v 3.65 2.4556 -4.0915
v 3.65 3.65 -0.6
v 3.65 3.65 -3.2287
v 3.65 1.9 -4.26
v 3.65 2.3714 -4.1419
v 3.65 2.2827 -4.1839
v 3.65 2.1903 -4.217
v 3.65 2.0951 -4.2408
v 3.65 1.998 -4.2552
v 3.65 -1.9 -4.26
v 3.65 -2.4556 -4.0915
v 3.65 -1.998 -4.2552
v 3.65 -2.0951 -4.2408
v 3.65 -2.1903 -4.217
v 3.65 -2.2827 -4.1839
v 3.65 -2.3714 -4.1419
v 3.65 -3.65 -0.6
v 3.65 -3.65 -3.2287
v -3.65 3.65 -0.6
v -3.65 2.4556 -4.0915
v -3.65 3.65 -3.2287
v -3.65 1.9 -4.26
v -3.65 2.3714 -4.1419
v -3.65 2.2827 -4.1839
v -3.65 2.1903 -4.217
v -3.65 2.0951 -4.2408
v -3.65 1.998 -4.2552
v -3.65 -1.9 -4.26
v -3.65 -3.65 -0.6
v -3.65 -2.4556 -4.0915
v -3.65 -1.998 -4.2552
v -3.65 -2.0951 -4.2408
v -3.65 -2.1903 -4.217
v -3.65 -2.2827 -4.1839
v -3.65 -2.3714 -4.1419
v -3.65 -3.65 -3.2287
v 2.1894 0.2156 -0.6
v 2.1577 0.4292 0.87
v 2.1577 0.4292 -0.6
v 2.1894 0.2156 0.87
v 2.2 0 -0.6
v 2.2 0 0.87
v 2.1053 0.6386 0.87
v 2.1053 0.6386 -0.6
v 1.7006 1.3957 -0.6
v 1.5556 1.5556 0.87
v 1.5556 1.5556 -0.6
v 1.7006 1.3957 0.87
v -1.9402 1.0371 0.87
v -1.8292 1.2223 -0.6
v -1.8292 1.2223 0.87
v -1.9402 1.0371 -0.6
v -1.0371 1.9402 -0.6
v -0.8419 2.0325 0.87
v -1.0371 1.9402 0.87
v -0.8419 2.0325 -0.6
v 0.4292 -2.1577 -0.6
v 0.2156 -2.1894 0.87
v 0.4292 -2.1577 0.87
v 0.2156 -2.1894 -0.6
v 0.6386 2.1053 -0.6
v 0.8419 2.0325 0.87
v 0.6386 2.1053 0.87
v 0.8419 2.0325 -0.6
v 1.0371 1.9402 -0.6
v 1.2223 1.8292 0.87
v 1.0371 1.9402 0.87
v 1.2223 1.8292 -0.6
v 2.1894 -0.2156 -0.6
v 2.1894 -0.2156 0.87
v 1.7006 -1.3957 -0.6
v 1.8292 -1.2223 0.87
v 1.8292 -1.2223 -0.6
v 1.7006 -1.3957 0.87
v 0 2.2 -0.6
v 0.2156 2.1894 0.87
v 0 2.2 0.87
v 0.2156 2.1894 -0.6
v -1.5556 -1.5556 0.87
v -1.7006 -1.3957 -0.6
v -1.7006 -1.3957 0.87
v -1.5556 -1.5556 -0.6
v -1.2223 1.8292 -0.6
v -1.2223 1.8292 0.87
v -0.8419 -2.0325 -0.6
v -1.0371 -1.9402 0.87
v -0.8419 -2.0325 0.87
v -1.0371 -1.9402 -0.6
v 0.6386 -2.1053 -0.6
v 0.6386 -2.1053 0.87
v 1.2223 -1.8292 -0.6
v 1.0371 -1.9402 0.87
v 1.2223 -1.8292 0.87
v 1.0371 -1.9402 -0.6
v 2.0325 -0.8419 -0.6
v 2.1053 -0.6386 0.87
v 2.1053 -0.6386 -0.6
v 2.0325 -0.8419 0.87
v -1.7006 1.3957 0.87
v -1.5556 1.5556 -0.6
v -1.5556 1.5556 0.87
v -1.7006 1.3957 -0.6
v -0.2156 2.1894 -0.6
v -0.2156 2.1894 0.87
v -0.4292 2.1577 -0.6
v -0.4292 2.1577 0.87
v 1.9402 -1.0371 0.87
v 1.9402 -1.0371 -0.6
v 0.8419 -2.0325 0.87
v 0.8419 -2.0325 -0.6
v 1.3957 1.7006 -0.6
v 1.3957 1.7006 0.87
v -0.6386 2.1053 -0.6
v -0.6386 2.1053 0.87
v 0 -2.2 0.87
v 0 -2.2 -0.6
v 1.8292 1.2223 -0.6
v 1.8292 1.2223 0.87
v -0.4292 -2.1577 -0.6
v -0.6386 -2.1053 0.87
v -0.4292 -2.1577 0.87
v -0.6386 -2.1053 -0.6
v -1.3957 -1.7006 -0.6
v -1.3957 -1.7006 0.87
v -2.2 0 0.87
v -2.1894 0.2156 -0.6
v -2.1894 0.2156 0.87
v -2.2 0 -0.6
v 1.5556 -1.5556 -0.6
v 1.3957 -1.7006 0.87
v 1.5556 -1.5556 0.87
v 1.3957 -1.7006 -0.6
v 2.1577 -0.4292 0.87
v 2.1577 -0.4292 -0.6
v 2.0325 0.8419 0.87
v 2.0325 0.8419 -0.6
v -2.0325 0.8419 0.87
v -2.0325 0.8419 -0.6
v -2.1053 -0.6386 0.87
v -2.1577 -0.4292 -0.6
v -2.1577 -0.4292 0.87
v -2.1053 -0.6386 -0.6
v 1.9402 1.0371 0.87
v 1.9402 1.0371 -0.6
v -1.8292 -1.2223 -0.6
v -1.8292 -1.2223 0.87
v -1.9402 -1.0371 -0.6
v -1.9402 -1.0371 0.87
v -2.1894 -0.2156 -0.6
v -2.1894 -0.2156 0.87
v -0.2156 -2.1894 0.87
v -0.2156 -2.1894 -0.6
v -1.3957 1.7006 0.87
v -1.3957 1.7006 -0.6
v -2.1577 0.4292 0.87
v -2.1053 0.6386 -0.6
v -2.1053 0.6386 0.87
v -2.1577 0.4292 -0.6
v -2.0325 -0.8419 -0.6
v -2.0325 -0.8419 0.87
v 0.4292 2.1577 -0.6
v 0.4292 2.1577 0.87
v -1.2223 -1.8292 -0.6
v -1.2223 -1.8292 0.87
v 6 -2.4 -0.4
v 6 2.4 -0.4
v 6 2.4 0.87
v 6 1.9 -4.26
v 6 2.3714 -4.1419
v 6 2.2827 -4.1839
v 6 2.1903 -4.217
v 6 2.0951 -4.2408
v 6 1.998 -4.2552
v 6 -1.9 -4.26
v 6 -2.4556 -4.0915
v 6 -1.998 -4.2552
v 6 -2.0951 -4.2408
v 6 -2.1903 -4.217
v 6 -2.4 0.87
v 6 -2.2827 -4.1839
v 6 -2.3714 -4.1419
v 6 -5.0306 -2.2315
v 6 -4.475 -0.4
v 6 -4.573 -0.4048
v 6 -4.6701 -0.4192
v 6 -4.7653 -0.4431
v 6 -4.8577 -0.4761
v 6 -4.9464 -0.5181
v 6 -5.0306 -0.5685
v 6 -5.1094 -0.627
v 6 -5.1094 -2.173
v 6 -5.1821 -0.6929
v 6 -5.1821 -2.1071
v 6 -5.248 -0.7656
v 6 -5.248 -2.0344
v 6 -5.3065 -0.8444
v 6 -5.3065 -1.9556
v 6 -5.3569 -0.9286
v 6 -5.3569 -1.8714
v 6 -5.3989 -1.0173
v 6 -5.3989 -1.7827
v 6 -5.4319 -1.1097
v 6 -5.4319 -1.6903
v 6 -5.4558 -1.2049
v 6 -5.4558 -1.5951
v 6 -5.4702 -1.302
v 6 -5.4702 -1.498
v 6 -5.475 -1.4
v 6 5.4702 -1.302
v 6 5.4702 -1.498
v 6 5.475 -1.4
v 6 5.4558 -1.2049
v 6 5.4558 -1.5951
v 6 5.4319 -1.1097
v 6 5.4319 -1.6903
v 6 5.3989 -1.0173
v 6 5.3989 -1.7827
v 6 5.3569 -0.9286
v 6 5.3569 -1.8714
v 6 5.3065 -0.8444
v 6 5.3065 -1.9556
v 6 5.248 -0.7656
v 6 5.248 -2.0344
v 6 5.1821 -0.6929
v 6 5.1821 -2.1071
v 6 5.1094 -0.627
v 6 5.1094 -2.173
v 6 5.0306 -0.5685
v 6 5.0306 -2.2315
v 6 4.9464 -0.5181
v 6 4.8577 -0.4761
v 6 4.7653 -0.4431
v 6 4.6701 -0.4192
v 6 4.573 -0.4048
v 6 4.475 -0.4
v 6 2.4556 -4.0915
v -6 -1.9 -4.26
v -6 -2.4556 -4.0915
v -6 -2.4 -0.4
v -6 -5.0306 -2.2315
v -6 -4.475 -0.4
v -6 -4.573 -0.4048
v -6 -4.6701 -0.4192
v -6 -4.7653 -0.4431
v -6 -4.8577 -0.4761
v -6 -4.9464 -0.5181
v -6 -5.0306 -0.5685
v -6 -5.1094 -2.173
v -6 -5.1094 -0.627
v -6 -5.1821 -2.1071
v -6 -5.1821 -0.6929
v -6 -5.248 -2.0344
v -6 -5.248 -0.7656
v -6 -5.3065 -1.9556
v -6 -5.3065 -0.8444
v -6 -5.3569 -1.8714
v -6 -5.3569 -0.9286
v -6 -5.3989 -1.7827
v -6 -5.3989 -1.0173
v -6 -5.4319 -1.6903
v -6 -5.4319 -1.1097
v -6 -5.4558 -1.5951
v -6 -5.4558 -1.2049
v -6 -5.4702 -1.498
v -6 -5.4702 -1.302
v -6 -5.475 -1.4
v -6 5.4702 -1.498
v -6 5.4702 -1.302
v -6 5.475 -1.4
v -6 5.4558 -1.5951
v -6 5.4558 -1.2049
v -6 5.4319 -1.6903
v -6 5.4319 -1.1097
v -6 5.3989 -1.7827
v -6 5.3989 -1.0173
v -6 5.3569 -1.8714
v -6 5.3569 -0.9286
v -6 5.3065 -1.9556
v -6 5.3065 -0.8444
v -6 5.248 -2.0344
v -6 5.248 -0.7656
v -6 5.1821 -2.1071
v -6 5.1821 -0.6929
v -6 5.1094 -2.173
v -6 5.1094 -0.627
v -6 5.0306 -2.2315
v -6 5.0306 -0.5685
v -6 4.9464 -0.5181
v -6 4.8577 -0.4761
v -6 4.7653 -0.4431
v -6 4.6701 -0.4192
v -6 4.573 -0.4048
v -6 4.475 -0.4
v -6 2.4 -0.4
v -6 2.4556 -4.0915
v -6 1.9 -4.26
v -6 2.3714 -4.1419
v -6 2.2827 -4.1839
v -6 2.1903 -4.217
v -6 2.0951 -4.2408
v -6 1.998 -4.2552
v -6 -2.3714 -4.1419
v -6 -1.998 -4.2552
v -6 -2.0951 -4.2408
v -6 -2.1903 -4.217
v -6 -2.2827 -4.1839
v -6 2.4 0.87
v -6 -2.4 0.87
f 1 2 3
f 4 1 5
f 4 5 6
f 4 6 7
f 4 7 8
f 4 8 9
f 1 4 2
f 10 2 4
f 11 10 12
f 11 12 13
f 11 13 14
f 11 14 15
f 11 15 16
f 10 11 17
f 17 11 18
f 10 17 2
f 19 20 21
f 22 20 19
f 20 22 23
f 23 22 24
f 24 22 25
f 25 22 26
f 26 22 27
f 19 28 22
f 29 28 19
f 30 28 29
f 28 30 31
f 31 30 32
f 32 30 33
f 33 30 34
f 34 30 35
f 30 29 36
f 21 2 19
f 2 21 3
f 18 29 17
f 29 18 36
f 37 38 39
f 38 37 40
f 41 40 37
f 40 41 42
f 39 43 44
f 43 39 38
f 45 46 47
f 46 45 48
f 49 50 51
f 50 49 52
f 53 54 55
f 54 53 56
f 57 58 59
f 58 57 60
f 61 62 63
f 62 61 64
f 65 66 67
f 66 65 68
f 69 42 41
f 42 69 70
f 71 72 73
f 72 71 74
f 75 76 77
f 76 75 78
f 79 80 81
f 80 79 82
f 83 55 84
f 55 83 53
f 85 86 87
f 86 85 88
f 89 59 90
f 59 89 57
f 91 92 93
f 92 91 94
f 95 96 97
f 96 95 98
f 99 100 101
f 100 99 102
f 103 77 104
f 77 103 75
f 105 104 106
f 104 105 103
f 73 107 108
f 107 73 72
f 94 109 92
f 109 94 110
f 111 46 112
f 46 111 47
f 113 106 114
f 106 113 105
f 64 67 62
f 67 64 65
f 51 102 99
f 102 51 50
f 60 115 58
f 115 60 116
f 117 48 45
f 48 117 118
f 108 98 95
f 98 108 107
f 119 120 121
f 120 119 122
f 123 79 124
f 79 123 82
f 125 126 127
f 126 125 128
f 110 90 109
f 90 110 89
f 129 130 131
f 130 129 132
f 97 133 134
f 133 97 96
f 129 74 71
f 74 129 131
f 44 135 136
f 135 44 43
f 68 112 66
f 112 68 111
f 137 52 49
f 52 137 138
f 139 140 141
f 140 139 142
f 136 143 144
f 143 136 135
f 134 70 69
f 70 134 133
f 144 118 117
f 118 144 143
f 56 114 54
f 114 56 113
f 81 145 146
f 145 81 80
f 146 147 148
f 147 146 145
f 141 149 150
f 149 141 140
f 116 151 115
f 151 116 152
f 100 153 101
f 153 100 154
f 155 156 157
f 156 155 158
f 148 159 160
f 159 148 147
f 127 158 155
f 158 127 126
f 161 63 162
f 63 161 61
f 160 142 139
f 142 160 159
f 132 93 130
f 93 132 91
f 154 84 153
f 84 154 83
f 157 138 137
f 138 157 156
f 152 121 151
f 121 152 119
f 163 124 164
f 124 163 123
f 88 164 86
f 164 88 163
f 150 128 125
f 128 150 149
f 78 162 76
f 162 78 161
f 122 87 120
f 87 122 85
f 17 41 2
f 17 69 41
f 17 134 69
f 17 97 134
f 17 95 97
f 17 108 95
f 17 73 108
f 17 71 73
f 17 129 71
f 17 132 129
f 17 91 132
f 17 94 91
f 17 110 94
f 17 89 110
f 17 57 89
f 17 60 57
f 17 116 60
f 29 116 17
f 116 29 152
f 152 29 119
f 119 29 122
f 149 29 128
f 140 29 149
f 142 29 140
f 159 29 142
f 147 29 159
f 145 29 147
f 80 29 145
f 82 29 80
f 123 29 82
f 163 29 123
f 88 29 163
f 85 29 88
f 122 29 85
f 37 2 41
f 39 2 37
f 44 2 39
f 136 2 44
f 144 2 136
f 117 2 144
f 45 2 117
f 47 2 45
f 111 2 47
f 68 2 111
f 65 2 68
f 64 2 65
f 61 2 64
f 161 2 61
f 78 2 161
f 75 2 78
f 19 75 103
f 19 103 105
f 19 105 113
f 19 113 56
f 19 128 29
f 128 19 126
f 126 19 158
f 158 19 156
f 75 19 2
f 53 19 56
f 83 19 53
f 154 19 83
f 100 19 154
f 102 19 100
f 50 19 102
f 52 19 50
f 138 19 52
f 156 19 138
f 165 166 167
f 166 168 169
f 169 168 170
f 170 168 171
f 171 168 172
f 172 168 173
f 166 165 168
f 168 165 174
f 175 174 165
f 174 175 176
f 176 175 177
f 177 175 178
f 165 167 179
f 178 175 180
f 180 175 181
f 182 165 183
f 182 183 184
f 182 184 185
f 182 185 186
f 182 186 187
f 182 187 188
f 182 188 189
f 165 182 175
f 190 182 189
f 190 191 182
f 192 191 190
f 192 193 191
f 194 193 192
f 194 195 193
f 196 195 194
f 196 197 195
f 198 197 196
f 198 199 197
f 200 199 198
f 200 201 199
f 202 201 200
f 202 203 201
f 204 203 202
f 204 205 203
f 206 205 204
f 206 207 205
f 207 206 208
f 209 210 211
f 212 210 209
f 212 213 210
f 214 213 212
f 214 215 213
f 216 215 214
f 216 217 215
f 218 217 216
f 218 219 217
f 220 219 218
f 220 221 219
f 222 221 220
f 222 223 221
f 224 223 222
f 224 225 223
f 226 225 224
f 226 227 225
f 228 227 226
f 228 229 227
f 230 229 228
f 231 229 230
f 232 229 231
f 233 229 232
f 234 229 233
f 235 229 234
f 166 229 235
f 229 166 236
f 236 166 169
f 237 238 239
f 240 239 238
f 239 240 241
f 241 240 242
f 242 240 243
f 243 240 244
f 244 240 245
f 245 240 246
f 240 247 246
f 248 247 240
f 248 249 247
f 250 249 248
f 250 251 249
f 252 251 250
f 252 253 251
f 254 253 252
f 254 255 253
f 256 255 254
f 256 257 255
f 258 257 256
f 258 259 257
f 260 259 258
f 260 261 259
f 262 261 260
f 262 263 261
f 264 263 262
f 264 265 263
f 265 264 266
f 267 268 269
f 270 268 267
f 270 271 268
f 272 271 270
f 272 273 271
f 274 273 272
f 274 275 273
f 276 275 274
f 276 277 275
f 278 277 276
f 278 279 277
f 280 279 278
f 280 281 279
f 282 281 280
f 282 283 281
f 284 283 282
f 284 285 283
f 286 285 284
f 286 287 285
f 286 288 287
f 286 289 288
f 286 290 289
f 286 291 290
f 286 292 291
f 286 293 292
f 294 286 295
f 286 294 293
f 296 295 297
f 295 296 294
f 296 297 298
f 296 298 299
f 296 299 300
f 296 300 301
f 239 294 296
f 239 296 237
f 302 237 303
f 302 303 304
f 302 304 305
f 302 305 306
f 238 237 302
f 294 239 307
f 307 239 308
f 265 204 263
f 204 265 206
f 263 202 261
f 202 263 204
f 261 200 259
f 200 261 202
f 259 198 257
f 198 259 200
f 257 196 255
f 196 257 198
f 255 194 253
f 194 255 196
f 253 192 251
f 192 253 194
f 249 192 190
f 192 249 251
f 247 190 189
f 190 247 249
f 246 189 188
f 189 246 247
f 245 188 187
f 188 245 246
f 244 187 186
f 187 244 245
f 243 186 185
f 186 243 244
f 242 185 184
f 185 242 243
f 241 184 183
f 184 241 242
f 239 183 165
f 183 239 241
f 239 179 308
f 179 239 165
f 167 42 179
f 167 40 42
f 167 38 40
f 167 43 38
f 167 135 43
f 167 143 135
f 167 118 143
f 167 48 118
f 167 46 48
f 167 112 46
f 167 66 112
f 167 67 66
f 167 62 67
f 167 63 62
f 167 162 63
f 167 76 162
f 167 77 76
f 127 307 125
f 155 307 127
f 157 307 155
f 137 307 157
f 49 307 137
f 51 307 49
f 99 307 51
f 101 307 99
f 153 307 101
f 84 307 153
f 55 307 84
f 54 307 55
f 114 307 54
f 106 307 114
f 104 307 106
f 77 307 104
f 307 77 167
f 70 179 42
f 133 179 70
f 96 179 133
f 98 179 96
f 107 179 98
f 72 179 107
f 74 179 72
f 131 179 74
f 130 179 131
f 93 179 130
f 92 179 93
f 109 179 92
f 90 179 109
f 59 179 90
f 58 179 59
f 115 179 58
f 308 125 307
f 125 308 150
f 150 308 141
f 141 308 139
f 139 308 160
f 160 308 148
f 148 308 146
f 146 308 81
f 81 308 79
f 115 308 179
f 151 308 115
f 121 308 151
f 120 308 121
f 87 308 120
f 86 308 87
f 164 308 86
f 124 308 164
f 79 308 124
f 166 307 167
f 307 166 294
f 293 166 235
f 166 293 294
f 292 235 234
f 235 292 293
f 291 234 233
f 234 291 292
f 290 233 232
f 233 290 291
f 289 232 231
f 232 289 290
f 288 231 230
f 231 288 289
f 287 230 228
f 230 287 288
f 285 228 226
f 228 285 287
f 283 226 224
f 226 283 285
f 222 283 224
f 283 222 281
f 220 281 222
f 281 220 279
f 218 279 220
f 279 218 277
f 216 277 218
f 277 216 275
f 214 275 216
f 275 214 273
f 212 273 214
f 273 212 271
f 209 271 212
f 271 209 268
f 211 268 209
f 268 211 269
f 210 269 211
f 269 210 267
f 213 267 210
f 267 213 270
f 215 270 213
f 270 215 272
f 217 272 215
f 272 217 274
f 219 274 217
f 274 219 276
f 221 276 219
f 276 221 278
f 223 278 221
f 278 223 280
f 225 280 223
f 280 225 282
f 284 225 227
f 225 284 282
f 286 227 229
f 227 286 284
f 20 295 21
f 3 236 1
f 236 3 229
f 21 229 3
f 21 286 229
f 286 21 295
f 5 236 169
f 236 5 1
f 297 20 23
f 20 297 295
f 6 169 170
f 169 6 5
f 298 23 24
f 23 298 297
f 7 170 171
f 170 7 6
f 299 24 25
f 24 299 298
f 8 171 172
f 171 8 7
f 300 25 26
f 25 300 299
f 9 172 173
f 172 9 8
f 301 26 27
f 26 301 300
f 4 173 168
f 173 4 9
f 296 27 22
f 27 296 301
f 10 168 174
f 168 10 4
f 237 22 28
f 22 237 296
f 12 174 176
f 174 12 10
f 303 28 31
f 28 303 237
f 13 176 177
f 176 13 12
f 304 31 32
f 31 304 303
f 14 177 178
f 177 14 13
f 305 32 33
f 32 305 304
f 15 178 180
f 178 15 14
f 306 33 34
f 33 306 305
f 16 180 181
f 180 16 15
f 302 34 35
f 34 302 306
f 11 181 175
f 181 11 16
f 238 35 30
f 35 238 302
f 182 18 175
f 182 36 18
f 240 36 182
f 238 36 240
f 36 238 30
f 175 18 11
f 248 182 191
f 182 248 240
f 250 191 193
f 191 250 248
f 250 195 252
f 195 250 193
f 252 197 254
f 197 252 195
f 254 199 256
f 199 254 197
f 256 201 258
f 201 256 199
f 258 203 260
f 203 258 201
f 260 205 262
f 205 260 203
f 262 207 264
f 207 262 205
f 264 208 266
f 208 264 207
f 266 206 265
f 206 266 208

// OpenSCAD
$fn=64;

h=12;

tol=0.4;

nut=[6.9+tol,6.9+tol,3+tol];
bolt=4+tol;

/// location of nut and direction of inserting
//nutZ=[0,5];
nutZ=[-5,-1+tol];

/////// profile 20x20
	prof=20;
	gap = 5.2;
	wall = 1.74;
	depth = 6.4;
	width1 = 4.6;
	width2 = 11.75;
	r1 = 1.5;
	r2 = 1;
/////// profile 20x20

not = 0.01;
inf=100;

///////////////////////////////////////


difference(){
	tr([h/2,0,wall/2],[0,-90,0]) linear_extrude(height=h){
		//profile2D();
		block();
	}
	
	r(0) union(){
		for(z=[nutZ[0]:nut.z/2:nutZ[1]]){
			t([0,0,-nut.z+z]) nutNegative(nut,bolt);
		}
		t([0,0,-nut.z+nutZ[1]]) nutNegative(nut,bolt);
	}
}

///////////////////////////////////////
module nut(size=[10,10,5],bolt=5){
	difference(){
		t([-size.x/2,-size.y/2,0]) cube(size);
		t([0,0,-size.z]) cylinder(d=bolt,h=3*size.z);
	}
}

module nutNegative(size=[10,10,5],bolt=5){
	t([-size.x/2,-size.y/2,0]) cube(size);
	t([0,0,-inf]) cylinder(d=bolt,h=2*inf);
}

module block(){
	t([-(prof/2-wall/2),0,0]){	
		hull(){
			for(y=[-1,1]) t([prof/2-wall-r2-tol,y*(width2/2-r2-tol)]) circle(r=r2);
			for(y=[-1,1]) t([prof/2-depth+r2+tol,y*(width1/2-tol)]) circle(r=r2);
		}
				
		t([prof/2-wall,0]) square([wall,gap-tol],center=true);
	}
}

module bolt(bolt=3, boltHead=6, boltPad=3, boltHeadL=10, boltL=30, nut=6.3, nutPad=5, nutL=4, nutR=0, sideCutL=20, sideCutSlot=4, layer1=0.2, layer2=0.2, tol=0.2, not=0.01){
	
	bottom=layer1>0?true:false;
	top=layer2>0?true:false;
	
	t([0,0,-boltL+not+boltPad]) cylinder(d=bolt+tol,h=boltL);

	t([0,0,boltPad-2*layer1]) difference(){
		cylinder(d=boltHead+tol,h=boltHeadL+2*layer1);
		
		//easy print bolt
		if(layer1>0){
			t([(bolt+tol)/2,-(boltHead+tol)/2,-not]) cube([(boltHead-bolt)/2,boltHead+tol,2*layer1+not]);
			t([-(boltHead+tol)/2,-(boltHead+tol)/2,-not]) cube([(boltHead-bolt)/2,boltHead+tol,2*layer1+not]);
			t([-(boltHead+tol)/2,-(boltHead+tol)/2,-not]) cube([boltHead+tol,(boltHead-bolt)/2,layer1+not]);
			t([-(boltHead+tol)/2,(bolt+tol)/2,-not]) cube([boltHead+tol,(boltHead-bolt)/2,layer1+not]);
		}
	}
	
	//nut
	if(nut>0 && nutL>0){
		rotate([0,0,nutR]) difference(){
			t([0,0,-nutPad-nutL-sideCutSlot-2*layer1]){
				cylinder(d=nut+tol,h=nutL+sideCutSlot+2*layer1+2*layer2,$fn=6);
				hull(){
					for(x=[0,sideCutL]) t([x,0,0]) cylinder(d=nut+tol,h=nutL+2*layer1,$fn=6);
				}
			}
		
		//easy print nut slot
		if(layer1>0){
				t([(bolt+tol)/2,-nut/2,-nutPad-nutL-sideCutSlot-2*layer1-not]) cube([sideCutL+nut+tol,nut,2*layer1+not]);
				t([-(bolt+tol)/2-nut,-nut/2,-nutPad-nutL-sideCutSlot-2*layer1-not]) cube([nut,nut,2*layer1+not]);
				t([-nut/2,-(bolt+tol)/2-nut,-nutPad-nutL-sideCutSlot-2*layer1-not]) cube([nut,nut,layer1+not]);
				t([-nut/2,+(bolt+tol)/2,-nutPad-nutL-sideCutSlot-2*layer1-not]) cube([nut,nut,layer1+not]);
			}				
		
		//easy print nut
		if(layer2>0){
				t([(bolt+tol)/2,-nut/2,-nutPad]) cube([nut,nut,2*layer2+not]);
				t([-(bolt+tol)/2-nut,-nut/2,-nutPad]) cube([nut,nut,2*layer2+not]);
				t([-nut/2,-(bolt+tol)/2-nut,-nutPad+layer2]) cube([nut,nut,layer2+not]);
				t([-nut/2,+(bolt+tol)/2,-nutPad+layer2]) cube([nut,nut,layer2+not]);
			}
		}
	}
}


///////////////////////////////////////

module t(v=[0,0,0]){translate(v) children();}
module r(a=[0,0,0],rp=[0,0,0]){translate(rp) rotate(a) translate(-rp) children();}
module tr(v=[0,0,0],a=[0,0,0],rp=[0,0,0]){t(v) r(a,rp) children();}
module rt(a=[0,0,0],rp=[0,0,0],v=[0,0,0]){r(a,rp) t(v) children();}
module u(){union() children();}
